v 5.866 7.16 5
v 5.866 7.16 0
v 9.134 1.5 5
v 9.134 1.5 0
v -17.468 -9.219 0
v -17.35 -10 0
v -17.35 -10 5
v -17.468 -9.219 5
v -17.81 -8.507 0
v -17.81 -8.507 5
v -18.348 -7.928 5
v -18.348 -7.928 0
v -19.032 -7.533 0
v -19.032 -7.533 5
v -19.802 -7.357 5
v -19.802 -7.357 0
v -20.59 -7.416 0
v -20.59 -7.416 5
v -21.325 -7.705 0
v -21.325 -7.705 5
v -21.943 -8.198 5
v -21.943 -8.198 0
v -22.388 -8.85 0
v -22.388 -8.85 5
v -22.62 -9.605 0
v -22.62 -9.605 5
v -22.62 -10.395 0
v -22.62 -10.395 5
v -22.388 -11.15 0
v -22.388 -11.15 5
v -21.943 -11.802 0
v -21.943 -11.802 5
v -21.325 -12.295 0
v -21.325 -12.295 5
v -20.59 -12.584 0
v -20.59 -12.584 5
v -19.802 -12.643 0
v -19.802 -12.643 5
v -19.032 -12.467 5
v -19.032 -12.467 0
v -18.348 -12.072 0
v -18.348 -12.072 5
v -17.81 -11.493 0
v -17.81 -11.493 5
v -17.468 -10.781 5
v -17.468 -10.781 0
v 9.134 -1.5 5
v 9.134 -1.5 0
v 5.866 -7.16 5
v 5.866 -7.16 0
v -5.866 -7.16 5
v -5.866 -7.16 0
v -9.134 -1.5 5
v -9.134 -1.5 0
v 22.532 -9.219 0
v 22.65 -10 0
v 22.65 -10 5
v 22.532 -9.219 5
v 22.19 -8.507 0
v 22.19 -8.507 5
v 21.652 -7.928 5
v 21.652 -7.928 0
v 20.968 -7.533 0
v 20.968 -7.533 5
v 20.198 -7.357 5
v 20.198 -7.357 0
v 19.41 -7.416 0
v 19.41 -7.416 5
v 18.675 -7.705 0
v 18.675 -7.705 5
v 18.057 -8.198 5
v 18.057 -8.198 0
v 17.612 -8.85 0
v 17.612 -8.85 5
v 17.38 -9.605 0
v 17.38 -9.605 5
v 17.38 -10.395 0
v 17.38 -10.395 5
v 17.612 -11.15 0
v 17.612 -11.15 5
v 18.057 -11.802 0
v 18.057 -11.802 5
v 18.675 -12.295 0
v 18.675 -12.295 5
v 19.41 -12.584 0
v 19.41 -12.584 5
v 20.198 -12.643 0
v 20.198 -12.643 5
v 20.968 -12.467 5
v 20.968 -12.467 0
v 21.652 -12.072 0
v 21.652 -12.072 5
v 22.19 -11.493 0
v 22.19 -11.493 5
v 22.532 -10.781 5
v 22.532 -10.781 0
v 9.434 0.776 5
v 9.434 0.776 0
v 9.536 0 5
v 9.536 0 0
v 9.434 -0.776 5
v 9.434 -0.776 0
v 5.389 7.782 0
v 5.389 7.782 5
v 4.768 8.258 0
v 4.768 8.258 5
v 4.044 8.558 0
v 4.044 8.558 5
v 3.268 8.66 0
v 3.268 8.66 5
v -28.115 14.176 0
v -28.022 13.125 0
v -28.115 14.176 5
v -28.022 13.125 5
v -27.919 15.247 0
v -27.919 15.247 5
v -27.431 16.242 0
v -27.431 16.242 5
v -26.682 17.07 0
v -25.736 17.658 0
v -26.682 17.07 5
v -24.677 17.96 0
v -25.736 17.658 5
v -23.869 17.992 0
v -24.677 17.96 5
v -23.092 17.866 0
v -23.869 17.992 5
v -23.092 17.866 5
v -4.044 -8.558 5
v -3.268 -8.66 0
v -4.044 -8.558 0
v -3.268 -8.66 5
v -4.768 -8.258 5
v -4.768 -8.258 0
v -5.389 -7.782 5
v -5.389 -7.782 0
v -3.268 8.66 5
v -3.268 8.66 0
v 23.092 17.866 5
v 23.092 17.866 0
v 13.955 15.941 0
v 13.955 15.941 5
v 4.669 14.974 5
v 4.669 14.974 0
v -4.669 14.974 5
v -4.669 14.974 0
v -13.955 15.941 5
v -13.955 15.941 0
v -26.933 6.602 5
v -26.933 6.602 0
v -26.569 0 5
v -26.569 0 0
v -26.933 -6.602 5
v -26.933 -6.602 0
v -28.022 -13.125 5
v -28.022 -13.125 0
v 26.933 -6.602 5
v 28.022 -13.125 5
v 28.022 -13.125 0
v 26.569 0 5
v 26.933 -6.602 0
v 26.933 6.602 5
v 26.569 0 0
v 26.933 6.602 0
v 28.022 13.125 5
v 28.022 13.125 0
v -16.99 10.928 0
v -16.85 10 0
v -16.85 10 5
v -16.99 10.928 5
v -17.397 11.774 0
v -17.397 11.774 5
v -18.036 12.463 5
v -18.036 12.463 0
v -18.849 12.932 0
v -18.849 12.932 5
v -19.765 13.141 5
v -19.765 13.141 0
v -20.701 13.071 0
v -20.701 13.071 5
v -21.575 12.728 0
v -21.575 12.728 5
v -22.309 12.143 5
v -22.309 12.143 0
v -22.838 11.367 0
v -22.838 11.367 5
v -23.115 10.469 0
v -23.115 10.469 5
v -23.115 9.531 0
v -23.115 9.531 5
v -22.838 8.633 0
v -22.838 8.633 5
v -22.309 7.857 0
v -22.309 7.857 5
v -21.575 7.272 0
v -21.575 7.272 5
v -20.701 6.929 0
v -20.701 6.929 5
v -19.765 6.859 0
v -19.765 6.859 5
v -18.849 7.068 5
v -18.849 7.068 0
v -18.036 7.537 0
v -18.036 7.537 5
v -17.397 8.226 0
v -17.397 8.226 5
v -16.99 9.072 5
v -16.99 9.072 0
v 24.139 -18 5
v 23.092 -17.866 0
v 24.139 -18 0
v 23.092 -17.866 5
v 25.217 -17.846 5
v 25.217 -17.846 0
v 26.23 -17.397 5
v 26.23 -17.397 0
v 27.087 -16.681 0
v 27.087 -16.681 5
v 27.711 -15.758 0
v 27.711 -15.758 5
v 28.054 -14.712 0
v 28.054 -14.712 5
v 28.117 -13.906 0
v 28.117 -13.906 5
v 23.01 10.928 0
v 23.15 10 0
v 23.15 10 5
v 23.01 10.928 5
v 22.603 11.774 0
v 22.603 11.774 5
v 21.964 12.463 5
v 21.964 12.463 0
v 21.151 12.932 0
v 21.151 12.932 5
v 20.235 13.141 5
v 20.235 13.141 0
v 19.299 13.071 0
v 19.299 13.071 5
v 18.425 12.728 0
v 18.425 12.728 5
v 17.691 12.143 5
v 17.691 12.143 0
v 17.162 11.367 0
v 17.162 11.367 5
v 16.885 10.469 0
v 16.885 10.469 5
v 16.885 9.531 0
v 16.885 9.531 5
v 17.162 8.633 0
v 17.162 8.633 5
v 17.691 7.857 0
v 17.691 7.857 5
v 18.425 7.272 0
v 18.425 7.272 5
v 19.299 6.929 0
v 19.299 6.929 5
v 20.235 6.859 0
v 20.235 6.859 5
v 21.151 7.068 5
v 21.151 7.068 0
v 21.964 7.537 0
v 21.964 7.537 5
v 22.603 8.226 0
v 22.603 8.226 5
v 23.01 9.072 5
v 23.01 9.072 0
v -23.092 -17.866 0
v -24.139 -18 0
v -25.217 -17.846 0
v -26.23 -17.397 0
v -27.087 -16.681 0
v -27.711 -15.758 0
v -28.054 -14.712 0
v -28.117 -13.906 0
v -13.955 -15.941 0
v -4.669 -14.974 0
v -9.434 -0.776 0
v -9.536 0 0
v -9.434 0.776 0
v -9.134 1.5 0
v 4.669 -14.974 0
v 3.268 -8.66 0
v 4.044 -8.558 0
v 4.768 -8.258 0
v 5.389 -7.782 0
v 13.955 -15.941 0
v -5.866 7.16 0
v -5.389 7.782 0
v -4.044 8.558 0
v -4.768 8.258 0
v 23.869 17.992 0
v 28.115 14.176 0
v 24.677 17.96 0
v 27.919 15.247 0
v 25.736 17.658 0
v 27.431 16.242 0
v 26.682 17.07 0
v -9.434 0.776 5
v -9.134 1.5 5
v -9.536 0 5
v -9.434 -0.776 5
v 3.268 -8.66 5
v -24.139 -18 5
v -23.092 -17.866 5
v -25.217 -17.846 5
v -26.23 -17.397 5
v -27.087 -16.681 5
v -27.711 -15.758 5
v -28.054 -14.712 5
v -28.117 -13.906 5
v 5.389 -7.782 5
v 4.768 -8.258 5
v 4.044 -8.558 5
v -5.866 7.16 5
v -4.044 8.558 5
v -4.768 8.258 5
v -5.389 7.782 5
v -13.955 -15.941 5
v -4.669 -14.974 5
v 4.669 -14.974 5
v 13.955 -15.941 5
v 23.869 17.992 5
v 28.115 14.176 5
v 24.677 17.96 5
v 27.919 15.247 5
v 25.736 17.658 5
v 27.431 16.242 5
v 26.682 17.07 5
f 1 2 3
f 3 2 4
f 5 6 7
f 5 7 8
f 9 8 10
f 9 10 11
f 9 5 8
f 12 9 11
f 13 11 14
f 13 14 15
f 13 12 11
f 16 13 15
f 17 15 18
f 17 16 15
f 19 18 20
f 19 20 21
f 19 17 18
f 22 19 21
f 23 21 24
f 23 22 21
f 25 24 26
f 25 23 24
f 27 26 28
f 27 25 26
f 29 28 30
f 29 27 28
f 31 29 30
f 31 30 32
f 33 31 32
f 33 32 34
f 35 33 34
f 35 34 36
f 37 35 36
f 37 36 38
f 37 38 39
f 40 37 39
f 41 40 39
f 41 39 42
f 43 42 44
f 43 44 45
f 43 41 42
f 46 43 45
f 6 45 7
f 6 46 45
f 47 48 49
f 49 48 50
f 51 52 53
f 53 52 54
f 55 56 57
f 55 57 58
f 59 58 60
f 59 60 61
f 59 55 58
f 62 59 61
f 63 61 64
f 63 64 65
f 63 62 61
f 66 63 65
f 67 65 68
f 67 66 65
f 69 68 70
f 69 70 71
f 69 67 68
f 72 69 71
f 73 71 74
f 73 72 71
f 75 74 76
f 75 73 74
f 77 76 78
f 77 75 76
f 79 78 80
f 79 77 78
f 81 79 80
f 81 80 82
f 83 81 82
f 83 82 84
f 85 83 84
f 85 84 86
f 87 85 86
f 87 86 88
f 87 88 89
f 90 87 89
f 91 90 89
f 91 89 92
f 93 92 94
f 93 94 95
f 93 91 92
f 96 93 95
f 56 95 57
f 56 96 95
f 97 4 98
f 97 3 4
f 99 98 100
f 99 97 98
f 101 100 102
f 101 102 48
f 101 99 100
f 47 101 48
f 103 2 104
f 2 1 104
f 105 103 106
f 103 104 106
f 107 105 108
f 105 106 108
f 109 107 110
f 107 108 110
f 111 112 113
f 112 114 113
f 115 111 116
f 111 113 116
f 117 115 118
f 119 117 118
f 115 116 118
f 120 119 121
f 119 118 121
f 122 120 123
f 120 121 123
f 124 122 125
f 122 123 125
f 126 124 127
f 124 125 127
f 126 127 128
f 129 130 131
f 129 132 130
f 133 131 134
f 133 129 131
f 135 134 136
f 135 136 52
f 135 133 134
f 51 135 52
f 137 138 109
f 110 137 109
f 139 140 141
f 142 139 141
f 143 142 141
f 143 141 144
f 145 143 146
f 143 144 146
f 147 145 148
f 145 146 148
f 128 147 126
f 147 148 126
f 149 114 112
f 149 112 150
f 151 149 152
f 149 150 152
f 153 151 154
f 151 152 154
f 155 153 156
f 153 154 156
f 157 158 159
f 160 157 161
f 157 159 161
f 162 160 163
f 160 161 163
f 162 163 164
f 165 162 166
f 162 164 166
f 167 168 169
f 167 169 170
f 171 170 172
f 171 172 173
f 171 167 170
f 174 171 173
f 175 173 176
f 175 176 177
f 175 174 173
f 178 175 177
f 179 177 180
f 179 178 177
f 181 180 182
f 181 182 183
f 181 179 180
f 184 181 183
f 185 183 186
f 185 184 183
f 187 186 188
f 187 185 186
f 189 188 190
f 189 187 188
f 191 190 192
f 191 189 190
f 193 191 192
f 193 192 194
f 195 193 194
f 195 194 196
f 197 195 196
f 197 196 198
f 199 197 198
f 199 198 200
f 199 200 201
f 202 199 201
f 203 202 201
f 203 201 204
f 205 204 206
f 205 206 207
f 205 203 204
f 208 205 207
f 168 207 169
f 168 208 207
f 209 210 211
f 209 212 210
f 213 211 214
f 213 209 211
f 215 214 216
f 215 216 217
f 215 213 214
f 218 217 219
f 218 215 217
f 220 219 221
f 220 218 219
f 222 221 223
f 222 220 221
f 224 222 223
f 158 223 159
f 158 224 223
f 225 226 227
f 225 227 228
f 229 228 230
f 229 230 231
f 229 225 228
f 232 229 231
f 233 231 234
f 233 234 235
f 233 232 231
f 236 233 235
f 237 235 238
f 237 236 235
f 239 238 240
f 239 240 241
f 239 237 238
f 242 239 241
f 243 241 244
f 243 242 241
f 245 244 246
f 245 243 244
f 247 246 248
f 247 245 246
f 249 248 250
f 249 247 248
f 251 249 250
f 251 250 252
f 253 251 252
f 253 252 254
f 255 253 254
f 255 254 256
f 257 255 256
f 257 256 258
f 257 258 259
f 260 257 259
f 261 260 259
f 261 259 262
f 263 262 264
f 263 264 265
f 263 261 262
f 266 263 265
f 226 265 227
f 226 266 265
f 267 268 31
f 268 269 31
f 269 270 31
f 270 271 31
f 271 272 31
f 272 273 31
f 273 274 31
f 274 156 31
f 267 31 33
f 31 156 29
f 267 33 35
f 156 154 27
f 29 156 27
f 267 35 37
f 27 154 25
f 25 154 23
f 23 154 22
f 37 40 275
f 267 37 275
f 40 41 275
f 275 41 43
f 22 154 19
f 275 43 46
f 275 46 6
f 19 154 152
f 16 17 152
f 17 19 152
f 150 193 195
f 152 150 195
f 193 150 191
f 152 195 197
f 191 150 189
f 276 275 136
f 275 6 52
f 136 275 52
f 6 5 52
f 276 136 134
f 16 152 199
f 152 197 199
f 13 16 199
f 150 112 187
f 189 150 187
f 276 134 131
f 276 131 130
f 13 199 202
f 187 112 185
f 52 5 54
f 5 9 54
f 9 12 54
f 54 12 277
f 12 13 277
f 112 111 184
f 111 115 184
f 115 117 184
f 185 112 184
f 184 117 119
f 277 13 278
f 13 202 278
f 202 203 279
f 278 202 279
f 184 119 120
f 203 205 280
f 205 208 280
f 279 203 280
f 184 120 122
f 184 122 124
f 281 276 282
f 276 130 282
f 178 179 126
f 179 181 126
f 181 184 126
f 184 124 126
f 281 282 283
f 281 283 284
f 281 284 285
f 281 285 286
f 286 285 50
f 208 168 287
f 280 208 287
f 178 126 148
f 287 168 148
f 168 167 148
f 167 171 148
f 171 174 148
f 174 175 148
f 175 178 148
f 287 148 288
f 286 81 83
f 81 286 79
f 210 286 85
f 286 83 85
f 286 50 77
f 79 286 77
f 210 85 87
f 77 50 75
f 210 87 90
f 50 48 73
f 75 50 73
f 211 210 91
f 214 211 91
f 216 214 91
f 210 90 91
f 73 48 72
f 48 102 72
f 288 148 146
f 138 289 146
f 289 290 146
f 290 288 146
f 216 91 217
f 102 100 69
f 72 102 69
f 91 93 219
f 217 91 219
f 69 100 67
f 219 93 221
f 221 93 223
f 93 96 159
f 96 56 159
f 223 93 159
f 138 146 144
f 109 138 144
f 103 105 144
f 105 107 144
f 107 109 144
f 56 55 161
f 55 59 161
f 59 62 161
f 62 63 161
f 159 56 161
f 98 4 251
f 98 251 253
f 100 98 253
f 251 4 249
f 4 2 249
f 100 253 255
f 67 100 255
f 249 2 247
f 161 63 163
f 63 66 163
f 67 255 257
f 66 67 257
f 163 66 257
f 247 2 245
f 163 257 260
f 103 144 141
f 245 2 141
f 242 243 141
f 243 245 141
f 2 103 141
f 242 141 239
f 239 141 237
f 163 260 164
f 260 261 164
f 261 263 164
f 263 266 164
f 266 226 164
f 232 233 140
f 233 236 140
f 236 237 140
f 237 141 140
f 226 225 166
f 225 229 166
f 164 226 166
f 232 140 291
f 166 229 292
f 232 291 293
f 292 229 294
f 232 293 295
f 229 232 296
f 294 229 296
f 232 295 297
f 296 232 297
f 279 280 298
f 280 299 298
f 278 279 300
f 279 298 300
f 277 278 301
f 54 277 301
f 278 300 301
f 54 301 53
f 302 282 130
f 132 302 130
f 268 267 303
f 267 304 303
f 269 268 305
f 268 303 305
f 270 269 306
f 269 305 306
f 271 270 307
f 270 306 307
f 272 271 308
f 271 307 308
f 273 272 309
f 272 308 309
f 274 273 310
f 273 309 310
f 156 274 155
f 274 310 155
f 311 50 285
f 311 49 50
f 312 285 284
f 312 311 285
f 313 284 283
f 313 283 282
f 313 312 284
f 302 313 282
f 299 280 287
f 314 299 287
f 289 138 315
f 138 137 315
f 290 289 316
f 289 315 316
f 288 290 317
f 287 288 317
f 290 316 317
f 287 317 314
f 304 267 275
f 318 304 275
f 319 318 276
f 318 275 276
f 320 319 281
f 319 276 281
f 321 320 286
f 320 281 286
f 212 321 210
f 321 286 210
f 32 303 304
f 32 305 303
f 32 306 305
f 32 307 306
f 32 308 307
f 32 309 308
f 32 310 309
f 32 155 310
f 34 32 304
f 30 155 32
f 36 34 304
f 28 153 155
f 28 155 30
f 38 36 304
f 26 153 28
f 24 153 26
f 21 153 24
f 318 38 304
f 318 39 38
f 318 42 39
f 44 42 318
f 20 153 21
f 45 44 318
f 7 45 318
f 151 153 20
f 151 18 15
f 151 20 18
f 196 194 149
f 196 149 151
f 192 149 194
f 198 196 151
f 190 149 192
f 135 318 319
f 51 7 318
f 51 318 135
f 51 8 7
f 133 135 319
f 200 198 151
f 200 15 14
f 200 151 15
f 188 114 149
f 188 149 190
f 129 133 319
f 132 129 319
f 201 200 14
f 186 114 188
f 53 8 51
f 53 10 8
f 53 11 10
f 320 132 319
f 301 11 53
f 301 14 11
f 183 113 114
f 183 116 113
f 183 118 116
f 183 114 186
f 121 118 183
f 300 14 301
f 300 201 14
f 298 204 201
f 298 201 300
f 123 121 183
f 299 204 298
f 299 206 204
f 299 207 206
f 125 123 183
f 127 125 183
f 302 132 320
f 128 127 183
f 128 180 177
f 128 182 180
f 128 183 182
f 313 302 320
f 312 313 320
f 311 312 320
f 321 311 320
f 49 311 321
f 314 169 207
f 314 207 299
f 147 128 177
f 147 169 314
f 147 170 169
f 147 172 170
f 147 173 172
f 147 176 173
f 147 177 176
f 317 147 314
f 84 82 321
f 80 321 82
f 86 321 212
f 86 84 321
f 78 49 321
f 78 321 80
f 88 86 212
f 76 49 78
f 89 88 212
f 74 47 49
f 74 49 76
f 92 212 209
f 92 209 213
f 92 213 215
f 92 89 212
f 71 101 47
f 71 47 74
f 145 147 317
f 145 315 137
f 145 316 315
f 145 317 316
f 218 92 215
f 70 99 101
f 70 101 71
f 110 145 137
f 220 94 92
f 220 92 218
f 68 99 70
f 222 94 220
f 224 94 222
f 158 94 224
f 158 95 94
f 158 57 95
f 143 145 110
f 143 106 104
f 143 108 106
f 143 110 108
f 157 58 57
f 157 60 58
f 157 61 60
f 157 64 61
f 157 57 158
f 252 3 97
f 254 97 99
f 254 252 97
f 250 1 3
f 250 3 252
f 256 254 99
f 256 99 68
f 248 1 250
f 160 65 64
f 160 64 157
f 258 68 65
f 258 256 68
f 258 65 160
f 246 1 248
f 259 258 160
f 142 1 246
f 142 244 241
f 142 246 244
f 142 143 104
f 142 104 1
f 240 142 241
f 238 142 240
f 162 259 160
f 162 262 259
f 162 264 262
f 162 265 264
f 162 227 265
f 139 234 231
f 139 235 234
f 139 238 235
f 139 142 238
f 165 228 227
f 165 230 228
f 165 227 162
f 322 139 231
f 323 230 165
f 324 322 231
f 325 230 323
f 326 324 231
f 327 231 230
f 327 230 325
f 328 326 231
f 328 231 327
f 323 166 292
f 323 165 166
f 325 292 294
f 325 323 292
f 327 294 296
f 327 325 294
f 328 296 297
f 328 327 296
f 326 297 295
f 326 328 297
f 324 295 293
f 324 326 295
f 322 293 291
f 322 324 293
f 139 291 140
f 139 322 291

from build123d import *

# Parameters (mm, degrees)
F0_R     = 2.65
F0_R_2   = 3.15
F1_DEPTH = 5
F2_R     = 4
F3_R     = 3


with BuildPart() as f1:
    # F0 (on Top) → F1 (new body)
    with BuildSketch(Plane.XY):
        with BuildLine():
            ThreePointArc((-30, -20), (0, -14.852814), (30, -20))
            ThreePointArc((30, -20), (26.568542, 0), (30, 20))
            ThreePointArc((30, 20), (0, 14.852814), (-30, 20))
            ThreePointArc((-30, 20), (-26.568542, 0), (-30, -20))
        make_face()
        with Locations((-20, -10)):
            Circle(F0_R, mode=Mode.SUBTRACT)
        with Locations((20, -10)):
            Circle(F0_R, mode=Mode.SUBTRACT)
        with Locations((-20, 10)):
            Circle(F0_R_2, mode=Mode.SUBTRACT)
        Polygon((10, 0), (5, -8.660254), (-5, -8.660254), (-10, 0), (-5, 8.660254), (5, 8.660254), align=None, mode=Mode.SUBTRACT)
        with Locations((20, 10)):
            Circle(F0_R_2, mode=Mode.SUBTRACT)
    extrude(amount=F1_DEPTH)

    # F2
    f2_edges = [f1.edges().sort_by_distance(p)[0] for p in [
        (30, 20, 2.5),
        (-30, 20, 2.5),
        (-30, -20, 2.5),
        (30, -20, 2.5),
    ]]
    fillet(f2_edges, radius=F2_R)

    # F3
    f3_edges = [f1.edges().sort_by_distance(p)[0] for p in [
        (5, 8.660254, 2.5),
        (-5, 8.660254, 2.5),
        (10, 0, 2.5),
        (5, -8.660254, 2.5),
        (-5, -8.660254, 2.5),
        (-10, 0, 2.5),
    ]]
    fillet(f3_edges, radius=F3_R)


solid = f1.part
